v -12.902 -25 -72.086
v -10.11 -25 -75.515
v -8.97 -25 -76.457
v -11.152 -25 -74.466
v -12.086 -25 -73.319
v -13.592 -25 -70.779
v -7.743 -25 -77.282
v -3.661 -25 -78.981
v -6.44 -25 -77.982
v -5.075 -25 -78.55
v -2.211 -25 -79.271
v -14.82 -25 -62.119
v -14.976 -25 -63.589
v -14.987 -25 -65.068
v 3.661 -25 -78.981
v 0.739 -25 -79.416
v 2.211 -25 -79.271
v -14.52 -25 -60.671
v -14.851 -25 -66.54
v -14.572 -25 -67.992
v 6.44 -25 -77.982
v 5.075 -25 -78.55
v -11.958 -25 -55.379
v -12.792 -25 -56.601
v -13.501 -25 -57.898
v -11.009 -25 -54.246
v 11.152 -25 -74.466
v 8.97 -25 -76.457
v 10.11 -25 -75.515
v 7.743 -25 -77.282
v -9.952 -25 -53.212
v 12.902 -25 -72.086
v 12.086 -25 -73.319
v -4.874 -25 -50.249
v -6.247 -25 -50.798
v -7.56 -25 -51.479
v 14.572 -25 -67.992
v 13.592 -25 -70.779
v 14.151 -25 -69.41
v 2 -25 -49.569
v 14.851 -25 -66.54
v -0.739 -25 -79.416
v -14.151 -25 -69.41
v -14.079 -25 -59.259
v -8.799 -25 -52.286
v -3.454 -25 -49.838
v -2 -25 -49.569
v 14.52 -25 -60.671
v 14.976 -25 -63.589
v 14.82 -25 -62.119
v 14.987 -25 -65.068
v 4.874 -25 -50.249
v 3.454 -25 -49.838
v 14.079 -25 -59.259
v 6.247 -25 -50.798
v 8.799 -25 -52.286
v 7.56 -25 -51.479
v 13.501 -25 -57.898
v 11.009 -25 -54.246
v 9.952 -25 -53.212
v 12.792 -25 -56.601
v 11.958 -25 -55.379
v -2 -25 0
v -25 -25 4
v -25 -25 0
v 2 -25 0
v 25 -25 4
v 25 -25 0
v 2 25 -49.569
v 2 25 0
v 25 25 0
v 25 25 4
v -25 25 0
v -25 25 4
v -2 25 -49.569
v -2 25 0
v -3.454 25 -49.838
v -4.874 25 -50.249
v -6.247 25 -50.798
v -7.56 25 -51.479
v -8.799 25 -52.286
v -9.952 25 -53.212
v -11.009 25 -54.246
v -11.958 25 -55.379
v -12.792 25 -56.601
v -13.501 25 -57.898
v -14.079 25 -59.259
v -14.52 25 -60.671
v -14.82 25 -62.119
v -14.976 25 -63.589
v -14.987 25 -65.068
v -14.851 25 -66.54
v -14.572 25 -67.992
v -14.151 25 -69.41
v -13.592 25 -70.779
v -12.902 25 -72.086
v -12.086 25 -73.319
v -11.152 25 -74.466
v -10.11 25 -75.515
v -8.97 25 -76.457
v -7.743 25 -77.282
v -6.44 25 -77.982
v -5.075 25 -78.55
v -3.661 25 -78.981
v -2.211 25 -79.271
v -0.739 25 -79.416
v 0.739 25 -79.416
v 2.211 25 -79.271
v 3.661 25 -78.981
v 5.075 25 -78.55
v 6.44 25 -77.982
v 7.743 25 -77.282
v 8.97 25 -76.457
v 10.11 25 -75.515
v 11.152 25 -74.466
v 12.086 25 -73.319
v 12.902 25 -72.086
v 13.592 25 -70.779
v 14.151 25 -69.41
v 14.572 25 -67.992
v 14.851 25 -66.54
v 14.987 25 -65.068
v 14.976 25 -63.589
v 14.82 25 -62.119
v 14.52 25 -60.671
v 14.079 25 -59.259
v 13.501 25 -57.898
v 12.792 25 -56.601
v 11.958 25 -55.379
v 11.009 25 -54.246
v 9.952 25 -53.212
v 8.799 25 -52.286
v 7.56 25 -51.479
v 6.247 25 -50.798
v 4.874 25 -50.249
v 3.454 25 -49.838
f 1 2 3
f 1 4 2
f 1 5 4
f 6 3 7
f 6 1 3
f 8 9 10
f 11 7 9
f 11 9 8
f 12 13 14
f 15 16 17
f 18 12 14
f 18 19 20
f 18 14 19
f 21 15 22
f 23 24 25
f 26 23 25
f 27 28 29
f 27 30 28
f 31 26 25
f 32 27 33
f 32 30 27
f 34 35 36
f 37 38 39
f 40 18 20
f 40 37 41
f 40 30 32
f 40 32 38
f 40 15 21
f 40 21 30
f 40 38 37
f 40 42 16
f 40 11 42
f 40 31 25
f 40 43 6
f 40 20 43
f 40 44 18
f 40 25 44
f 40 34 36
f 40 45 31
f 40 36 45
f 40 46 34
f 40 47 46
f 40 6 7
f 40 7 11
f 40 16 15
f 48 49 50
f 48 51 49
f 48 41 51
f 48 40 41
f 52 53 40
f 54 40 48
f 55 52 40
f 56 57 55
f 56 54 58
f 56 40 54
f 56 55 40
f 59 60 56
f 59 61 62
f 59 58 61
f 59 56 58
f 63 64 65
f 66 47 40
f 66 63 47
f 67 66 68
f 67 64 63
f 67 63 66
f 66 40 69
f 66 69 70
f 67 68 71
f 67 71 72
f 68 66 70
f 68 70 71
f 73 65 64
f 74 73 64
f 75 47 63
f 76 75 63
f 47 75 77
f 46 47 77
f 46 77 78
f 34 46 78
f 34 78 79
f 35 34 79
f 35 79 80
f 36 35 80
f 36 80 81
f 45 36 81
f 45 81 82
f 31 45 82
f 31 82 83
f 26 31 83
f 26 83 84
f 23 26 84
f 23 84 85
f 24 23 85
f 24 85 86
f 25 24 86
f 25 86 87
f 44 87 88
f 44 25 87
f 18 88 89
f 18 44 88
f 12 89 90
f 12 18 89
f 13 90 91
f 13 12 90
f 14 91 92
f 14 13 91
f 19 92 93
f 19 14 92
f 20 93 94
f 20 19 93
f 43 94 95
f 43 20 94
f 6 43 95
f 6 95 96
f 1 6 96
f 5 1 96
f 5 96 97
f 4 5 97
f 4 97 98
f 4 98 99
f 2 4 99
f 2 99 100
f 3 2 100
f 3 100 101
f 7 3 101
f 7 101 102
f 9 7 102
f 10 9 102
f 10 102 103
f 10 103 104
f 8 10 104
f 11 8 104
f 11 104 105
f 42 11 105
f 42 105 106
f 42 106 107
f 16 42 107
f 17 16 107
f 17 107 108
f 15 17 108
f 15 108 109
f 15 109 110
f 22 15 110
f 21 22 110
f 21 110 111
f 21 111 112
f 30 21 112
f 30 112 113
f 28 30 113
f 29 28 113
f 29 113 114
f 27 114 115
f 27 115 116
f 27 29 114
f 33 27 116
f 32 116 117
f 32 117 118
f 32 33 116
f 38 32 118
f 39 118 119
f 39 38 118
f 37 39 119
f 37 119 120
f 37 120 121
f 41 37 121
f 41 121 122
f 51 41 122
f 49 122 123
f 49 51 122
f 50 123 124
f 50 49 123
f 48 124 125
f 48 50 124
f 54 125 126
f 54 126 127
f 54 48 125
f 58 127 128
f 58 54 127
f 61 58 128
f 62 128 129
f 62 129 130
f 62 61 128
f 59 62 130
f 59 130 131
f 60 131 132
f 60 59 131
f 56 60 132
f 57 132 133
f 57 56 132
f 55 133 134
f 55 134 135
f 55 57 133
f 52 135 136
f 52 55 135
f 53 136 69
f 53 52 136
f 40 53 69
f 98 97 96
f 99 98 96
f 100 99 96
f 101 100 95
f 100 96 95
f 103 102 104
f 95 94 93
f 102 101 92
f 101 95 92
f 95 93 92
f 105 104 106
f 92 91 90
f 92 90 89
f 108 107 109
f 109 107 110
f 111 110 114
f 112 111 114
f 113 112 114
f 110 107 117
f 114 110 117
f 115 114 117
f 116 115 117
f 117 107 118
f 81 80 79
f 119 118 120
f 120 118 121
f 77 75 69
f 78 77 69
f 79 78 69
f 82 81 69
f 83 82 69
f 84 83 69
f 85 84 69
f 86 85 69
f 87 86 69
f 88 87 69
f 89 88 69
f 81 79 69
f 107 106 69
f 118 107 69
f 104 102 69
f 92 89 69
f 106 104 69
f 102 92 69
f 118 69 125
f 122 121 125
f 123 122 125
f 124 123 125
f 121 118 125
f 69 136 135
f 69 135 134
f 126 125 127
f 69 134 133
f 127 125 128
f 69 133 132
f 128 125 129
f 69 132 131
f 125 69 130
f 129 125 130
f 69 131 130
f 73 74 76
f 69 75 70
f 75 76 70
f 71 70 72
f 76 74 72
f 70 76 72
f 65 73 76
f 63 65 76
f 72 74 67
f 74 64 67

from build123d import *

# Parameters (mm, degrees)
F0_W     = 4
F0_H     = 50
F1_DEPTH = 25
F2_W     = 50
F2_H     = 4
F3_DEPTH = 25
F4_R     = 15
F5_DEPTH = 25


with BuildPart() as f1:
    # F0 (on Front) → F1 (new body, symmetric)
    with BuildSketch(Plane.XZ):
        with Locations((0, -25)):
            Rectangle(F0_W, F0_H)
    extrude(amount=F1_DEPTH, both=True)

    # F2 (on Front) → F3 (join, symmetric)
    with BuildSketch(Plane.XZ):
        with Locations((0, 2)):
            Rectangle(F2_W, F2_H)
    extrude(amount=F3_DEPTH, both=True)

    # F4 (on Front) → F5 (join, symmetric)
    with BuildSketch(Plane.XZ):
        with Locations((0, -64.434606)):
            Circle(F4_R)
    extrude(amount=F5_DEPTH, both=True)


solid = f1.part
